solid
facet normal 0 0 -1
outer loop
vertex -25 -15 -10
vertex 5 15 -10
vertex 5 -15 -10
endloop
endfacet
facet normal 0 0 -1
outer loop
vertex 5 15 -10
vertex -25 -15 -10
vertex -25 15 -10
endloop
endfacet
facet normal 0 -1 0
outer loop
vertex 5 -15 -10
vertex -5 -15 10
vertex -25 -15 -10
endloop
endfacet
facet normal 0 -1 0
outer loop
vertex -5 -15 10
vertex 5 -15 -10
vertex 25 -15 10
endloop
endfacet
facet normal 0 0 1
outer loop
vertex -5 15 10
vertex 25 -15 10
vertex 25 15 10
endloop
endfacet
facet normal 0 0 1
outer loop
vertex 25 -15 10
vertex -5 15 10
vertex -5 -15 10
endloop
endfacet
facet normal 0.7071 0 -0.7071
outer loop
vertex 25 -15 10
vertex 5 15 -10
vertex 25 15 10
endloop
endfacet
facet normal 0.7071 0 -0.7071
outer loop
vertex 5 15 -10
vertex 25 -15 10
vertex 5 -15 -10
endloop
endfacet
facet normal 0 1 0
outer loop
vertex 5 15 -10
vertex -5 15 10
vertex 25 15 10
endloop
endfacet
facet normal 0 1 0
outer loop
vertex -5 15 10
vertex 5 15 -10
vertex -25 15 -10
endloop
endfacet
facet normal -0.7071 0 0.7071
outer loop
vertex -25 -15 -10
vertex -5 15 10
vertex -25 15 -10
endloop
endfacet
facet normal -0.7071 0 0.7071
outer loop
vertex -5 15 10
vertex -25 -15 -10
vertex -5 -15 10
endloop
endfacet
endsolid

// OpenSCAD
echo (tan(0));
skewedCube([30,30,20],[45,0],center=true);

module skewedCube(size=[1,1,1],skew=[45,45],center=false){
  skwDstX= tan(skew.x) ? size.z/tan(skew.x) : 0;
  skwDstY= tan(skew.y) ? size.z/tan(skew.y) : 0;
  skewDist= [skwDstX,skwDstY];
  centerOffset= center ? [-(size.x+skewDist.x)/2,-(size.x+skewDist.y)/2,-size.z/2]: [0,0,0];
  
  polys= // -- bottom --
         [[0,0,0],          //0
         [size.x,0,0],      //1
         [size.x,size.y,0], //2
         [0,size.y,0],      //3
         // -- top --
         [skewDist.x,skewDist.y,size.z],             //4
         [size.x+skewDist.x,skewDist.y,size.z],      //5
         [size.x+skewDist.x,size.y+skewDist.y,size.z], //6
         [skewDist.x,size.y+skewDist.y,size.z]];       //7
  
  faces=[[0,1,2,3],  // bottom
  [4,5,1,0],  // front
  [7,6,5,4],  // top
  [5,6,2,1],  // right
  [6,7,3,2],  // back
  [7,4,0,3]]; // left
  
  translate(centerOffset) polyhedron(polys,faces);
}
